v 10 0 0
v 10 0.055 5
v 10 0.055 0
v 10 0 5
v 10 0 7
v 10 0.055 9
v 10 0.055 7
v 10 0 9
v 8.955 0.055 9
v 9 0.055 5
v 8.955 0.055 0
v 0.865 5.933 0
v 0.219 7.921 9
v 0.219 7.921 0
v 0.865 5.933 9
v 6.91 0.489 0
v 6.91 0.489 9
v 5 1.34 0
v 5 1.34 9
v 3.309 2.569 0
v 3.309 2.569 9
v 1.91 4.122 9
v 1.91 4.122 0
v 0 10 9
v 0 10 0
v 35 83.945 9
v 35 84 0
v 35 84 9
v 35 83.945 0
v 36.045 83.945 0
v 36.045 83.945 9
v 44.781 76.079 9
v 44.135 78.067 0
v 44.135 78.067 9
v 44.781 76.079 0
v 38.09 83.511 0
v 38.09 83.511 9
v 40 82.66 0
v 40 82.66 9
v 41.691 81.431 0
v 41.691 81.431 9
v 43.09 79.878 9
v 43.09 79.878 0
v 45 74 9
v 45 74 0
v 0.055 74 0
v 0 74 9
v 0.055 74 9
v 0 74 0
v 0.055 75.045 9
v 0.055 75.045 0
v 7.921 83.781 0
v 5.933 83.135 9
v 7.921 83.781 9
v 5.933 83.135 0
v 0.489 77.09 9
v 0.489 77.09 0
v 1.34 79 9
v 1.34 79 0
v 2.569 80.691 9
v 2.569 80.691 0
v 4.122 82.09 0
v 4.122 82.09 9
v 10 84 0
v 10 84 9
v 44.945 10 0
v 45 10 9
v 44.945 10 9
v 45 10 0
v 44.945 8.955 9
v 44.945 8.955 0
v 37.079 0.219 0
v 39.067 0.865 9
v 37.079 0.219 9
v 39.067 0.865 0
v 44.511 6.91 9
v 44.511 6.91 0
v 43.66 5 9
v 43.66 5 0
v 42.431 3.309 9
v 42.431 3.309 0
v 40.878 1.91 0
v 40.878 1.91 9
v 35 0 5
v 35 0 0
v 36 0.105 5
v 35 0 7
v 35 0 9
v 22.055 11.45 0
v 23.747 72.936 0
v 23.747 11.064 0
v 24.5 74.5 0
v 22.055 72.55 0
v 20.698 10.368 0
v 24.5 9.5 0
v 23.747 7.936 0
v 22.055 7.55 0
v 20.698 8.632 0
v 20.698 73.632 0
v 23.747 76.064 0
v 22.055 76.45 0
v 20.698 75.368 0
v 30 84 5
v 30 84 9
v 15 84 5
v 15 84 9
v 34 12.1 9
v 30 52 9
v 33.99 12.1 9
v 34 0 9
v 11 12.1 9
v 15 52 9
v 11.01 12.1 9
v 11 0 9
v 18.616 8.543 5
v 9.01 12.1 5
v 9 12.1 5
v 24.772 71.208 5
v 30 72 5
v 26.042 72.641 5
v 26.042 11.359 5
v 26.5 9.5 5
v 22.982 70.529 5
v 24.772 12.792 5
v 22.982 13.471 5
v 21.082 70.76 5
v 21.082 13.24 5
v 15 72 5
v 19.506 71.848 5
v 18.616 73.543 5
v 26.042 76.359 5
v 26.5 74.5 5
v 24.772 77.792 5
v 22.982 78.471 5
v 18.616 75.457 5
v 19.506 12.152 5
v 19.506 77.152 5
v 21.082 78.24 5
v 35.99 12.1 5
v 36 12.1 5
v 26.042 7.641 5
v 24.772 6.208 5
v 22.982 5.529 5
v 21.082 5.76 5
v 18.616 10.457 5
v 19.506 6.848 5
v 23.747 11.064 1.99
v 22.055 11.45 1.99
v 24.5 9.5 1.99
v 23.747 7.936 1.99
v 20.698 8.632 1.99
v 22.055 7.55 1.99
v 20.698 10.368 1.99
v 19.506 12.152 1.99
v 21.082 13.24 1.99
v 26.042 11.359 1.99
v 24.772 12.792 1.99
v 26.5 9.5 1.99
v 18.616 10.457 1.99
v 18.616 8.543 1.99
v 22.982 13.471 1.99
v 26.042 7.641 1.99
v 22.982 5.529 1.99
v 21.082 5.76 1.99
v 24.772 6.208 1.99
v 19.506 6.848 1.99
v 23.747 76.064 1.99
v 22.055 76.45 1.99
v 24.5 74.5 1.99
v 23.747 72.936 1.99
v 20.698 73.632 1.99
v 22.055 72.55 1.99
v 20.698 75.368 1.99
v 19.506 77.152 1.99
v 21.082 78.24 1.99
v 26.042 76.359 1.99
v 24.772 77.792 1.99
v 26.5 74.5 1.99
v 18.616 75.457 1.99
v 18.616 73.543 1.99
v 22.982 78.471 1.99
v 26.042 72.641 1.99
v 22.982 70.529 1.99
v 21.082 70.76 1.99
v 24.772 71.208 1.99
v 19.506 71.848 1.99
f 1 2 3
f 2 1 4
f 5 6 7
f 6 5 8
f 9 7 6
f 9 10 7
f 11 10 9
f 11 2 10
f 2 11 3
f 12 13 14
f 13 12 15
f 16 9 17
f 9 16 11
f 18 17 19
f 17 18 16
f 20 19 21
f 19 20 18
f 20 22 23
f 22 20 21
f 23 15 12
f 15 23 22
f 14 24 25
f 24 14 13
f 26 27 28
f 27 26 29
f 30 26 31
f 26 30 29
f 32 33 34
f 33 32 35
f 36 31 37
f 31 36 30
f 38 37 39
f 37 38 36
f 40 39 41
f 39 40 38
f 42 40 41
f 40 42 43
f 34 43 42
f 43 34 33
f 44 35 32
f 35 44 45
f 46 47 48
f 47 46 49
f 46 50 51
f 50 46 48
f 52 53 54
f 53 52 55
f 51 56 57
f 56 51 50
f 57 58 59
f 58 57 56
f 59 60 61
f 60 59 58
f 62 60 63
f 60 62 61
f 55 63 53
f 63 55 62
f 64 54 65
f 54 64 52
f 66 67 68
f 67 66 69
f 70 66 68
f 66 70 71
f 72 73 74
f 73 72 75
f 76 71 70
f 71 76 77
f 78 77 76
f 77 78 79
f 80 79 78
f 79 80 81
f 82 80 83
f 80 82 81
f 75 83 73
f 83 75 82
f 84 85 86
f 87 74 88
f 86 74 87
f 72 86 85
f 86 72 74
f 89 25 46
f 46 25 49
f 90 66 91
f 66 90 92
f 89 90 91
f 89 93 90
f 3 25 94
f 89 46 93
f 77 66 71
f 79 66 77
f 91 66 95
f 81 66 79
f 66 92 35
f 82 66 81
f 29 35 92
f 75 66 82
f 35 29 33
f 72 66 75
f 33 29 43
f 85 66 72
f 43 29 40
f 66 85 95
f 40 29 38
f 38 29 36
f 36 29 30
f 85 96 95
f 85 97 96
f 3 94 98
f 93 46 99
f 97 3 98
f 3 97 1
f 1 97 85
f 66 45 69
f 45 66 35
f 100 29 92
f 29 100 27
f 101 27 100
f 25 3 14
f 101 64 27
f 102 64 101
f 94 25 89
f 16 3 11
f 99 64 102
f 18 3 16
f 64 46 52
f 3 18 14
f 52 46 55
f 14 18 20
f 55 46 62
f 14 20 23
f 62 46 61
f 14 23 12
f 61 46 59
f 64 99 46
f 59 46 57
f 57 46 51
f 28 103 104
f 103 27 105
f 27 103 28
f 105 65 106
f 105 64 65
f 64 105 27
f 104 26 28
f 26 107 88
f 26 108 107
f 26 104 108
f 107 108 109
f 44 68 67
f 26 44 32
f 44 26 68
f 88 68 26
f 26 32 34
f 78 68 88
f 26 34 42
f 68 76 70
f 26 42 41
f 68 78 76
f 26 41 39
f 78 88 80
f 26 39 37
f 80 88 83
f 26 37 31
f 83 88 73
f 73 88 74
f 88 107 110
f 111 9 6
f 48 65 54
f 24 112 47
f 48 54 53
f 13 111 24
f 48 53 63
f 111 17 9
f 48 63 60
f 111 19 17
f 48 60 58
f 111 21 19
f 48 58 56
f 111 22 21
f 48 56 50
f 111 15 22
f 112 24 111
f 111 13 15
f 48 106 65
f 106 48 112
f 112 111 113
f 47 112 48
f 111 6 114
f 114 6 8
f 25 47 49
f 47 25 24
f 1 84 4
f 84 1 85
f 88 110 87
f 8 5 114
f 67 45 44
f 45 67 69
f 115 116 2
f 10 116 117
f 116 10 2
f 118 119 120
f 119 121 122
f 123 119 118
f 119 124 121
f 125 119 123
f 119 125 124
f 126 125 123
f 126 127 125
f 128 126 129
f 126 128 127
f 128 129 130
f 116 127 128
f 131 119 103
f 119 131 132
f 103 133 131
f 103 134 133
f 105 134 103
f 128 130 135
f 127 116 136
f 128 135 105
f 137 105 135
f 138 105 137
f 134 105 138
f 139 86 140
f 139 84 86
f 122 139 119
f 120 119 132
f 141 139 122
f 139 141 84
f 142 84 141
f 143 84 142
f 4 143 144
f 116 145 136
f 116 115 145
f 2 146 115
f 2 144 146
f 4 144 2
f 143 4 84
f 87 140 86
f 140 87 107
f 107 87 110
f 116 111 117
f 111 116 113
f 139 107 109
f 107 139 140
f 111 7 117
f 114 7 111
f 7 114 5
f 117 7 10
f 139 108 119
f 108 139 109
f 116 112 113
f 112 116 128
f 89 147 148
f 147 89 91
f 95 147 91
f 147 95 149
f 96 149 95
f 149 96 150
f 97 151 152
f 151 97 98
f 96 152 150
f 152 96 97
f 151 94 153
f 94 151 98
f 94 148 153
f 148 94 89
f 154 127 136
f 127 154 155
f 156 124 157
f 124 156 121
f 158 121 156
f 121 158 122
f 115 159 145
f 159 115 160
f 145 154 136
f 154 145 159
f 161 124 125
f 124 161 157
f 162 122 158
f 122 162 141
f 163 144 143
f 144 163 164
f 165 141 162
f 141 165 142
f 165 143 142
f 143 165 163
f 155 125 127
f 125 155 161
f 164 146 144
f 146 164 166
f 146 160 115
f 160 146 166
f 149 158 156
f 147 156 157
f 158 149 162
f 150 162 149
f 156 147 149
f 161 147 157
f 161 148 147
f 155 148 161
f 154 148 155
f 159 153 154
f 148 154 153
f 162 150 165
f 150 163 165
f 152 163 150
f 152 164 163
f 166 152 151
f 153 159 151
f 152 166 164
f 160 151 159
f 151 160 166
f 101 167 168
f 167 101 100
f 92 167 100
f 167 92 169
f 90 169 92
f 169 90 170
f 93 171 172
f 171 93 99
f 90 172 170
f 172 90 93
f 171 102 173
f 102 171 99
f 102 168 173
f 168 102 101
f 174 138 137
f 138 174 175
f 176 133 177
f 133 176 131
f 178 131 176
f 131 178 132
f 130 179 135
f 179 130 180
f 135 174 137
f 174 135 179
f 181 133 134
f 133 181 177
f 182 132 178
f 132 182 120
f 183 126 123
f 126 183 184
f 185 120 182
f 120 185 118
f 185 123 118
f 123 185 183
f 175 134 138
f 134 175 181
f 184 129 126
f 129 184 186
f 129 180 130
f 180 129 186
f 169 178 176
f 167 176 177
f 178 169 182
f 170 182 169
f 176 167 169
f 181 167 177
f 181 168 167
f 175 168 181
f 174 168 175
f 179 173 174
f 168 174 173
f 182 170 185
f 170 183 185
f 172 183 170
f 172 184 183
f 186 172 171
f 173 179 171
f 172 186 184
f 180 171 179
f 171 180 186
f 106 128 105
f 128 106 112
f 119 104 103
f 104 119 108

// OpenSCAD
// file: parts/slide.scad
module slide(l, h, w1, w2){
    translate([-w1/2, -l/2, -h/2])
    polyhedron(
        points=[
            // lowest layer
            [0, 0, 0],
            [w1, 0, 0],
            [w2-((w2-w1)/2), l, 0],
            [-((w2-w1)/2), l, 0],

            // top layer
            [h/2, 0, h],
            [w1-h/2, 0, h],
            [w2-((w2-w1)/2)-h/2, l, h],
            [-((w2-w1)/2)+h/2, l, h],
            [0, h/2, h],
            [0, w1-h/2, h],
            [l, w2-((w2-w1)/2), h],
            [l, -((w2-w1)/2)+h/2, h]
        ],
        faces=[
            // bottom
            [0, 3, 2, 1],

            // sides beginning with front
            [0, 1, 5, 4],
            [1, 2, 6, 5],
            [3, 7, 6, 2],
            [0, 4, 7, 3],

            // top
            [4, 5, 6, 7]
        ]
    );
}

slide(60, 5, 20, 24);
// file: parts/box_rounded.scad
use <box.scad>;

module box_rounded(w, l, h, r) {
    difference() {
        box(w, l, h);

        translate([l, w, 0]) rotate([0, 0, 180]) difference() {
            translate([0, 0, h / 2]) cube([2*r, 2*r, 2*h], center = true);
            translate([r, r, h / 2]) cylinder(h = 3*h, r = r, center = true, $fn=60);
        }

        translate([0, w, 0]) rotate([0, 0, 270]) difference() {
            translate([0, 0, h / 2]) cube([2*r, 2*r, 2*h], center = true);
            translate([r, r, h / 2]) cylinder(h = 3*h, r = r, center = true, $fn=60);
        }

        translate([l, 0, 0]) rotate([0, 0, 90]) difference() {
            translate([0, 0, h / 2]) cube([2*r, 2*r, 2*h], center = true);
            translate([r, r, h / 2]) cylinder(h = 3*h, r = r, center = true, $fn=60);
        }

        difference() {
            translate([0, 0, h / 2]) cube([2*r, 2*r, 2*h], center = true);
            translate([r, r, h / 2]) cylinder(h = 3*h, r = r, center = true, $fn=60);
        }
    }
}

box_rounded(30, 50, 5, 5);
// file: parts/box.scad
module box(w, l, h){
    polyhedron(
        points=[
            // lowest layer
            [0, 0, 0],
            [0, w, 0],
            [l, w, 0],
            [l, 0, 0],

            // top layer
            [0, 0, h],
            [0, w, h],
            [l, w, h],
            [l, 0, h]
        ],
        faces=[
            // bottom
            [0, 3, 2, 1],

            // sides beginning with front
            [0, 1, 5, 4],
            [1, 2, 6, 5],
            [3, 7, 6, 2],
            [0, 4, 7, 3],

            // top
            [4, 5, 6, 7]
        ]
    );
}

box(30, 50, 5);
// file: parts/screw_hole.scad
module screw_hole(r1, h1, r2, h2, r3, h3){
    d = 0.01;

    union() {
        cylinder(h=h1, r=r1, $fn=60);
        translate([0, 0, h1-d]) cylinder(h=h2+d, r1=r1, r2=r2, $fn=60);
        translate([0, 0, h1+h2-d]) cylinder(h=h3+d, r=r3, $fn=60);
    }
}

screw_hole(r1=10, h1=10, r2=20, h2=10, r3=30, h3=10);
// main file
use <parts/screw_hole.scad>;
use <parts/box.scad>;
use <parts/box_rounded.scad>;
use <parts/slide.scad>;

width = 15;
depth = 84;
distance = 65;

difference() {
    box_rounded(depth, 45, 9, 10);

    translate([45/2-width/2, 10, 5])
        box(depth, width, 5);
    translate([45/2, 0, 5 + 2.5])
        union() {
            translate([0, depth/2-55+0.1, 0])
                slide(l = 50, h = 5, w1 = width+12, w2 = width+12);

            translate([0, depth/2, 0])
                slide(l = 60, h = 5, w1 = width+12, w2 = width);
        }
    translate([45/2, (depth-distance)/2, -1])
        screw_hole(r1=2, h1=1, r2=2, h2=2, r3=4, h3=4);
    translate([45/2, depth-(depth-distance)/2, -1])
        screw_hole(r1=2, h1=1, r2=2, h2=2, r3=4, h3=4);
}
